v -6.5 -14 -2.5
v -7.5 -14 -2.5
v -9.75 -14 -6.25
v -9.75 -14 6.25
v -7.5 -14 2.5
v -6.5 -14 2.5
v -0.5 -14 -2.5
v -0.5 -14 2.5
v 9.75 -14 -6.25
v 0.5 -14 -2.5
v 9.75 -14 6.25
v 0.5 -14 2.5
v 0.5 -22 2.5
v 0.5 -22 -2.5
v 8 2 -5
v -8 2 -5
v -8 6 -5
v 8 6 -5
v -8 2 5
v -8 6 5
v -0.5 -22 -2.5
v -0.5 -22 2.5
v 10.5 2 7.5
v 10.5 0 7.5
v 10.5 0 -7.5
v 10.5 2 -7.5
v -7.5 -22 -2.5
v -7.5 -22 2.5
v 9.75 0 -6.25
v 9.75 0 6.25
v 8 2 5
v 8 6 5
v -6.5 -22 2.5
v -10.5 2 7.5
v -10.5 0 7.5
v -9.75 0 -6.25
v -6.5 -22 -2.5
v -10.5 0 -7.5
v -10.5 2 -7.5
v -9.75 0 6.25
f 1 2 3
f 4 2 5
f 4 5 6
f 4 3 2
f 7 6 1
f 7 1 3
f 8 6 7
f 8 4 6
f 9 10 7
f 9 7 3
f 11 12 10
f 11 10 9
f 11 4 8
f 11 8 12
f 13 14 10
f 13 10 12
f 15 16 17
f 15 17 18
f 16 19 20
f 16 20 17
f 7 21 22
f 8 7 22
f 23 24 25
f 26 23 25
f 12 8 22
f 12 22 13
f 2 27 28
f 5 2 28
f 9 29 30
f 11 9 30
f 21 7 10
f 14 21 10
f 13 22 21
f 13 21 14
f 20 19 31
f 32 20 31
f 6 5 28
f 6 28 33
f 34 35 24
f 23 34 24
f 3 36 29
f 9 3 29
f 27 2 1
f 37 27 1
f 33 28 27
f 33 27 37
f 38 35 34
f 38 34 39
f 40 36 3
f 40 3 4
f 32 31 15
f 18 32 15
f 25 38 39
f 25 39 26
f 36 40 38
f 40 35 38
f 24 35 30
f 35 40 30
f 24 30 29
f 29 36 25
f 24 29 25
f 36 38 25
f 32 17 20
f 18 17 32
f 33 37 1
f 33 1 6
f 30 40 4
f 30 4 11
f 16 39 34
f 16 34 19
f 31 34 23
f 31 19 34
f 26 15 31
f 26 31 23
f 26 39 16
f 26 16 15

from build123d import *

# Parameters (mm, degrees)
SKETCH_1_W      = 21
SKETCH_1_H      = 15
EXTRUDE_1_DEPTH = 2
SKETCH_2_W      = 16
SKETCH_2_H      = 10
EXTRUDE_2_DEPTH = 4
SKETCH_3_W      = 19.5
SKETCH_3_H      = 12.5
EXTRUDE_3_DEPTH = 14
SKETCH_4_W      = 1
SKETCH_4_H      = 5
EXTRUDE_4_DEPTH = 8


with BuildPart() as part:
    # Эскиз1 → Бобышка-Вытянуть1 (new body)
    with BuildSketch(Plane(origin=(0, 0, 0), x_dir=(1, 0, 0), z_dir=(0, 1, 0))):
        Rectangle(SKETCH_1_W, SKETCH_1_H)
    extrude(amount=EXTRUDE_1_DEPTH)

    # Эскиз2 → Бобышка-Вытянуть2 (add)
    with BuildSketch(Plane(origin=(0, 2, 0), x_dir=(1, 0, 0), z_dir=(0, 1, 0))):
        Rectangle(SKETCH_2_W, SKETCH_2_H)
    extrude(amount=EXTRUDE_2_DEPTH)

    # Эскиз3 → Бобышка-Вытянуть3 (add)
    with BuildSketch(Plane.XZ):
        Rectangle(SKETCH_3_W, SKETCH_3_H)
    extrude(amount=EXTRUDE_3_DEPTH)

    # Эскиз4 → Бобышка-Вытянуть4 (add)
    with BuildSketch(Plane.XZ.offset(14)):
        with Locations((-7, 0)):
            Rectangle(SKETCH_4_W, SKETCH_4_H)
        Rectangle(SKETCH_4_W, SKETCH_4_H)
    extrude(amount=EXTRUDE_4_DEPTH)


solid = part.part
